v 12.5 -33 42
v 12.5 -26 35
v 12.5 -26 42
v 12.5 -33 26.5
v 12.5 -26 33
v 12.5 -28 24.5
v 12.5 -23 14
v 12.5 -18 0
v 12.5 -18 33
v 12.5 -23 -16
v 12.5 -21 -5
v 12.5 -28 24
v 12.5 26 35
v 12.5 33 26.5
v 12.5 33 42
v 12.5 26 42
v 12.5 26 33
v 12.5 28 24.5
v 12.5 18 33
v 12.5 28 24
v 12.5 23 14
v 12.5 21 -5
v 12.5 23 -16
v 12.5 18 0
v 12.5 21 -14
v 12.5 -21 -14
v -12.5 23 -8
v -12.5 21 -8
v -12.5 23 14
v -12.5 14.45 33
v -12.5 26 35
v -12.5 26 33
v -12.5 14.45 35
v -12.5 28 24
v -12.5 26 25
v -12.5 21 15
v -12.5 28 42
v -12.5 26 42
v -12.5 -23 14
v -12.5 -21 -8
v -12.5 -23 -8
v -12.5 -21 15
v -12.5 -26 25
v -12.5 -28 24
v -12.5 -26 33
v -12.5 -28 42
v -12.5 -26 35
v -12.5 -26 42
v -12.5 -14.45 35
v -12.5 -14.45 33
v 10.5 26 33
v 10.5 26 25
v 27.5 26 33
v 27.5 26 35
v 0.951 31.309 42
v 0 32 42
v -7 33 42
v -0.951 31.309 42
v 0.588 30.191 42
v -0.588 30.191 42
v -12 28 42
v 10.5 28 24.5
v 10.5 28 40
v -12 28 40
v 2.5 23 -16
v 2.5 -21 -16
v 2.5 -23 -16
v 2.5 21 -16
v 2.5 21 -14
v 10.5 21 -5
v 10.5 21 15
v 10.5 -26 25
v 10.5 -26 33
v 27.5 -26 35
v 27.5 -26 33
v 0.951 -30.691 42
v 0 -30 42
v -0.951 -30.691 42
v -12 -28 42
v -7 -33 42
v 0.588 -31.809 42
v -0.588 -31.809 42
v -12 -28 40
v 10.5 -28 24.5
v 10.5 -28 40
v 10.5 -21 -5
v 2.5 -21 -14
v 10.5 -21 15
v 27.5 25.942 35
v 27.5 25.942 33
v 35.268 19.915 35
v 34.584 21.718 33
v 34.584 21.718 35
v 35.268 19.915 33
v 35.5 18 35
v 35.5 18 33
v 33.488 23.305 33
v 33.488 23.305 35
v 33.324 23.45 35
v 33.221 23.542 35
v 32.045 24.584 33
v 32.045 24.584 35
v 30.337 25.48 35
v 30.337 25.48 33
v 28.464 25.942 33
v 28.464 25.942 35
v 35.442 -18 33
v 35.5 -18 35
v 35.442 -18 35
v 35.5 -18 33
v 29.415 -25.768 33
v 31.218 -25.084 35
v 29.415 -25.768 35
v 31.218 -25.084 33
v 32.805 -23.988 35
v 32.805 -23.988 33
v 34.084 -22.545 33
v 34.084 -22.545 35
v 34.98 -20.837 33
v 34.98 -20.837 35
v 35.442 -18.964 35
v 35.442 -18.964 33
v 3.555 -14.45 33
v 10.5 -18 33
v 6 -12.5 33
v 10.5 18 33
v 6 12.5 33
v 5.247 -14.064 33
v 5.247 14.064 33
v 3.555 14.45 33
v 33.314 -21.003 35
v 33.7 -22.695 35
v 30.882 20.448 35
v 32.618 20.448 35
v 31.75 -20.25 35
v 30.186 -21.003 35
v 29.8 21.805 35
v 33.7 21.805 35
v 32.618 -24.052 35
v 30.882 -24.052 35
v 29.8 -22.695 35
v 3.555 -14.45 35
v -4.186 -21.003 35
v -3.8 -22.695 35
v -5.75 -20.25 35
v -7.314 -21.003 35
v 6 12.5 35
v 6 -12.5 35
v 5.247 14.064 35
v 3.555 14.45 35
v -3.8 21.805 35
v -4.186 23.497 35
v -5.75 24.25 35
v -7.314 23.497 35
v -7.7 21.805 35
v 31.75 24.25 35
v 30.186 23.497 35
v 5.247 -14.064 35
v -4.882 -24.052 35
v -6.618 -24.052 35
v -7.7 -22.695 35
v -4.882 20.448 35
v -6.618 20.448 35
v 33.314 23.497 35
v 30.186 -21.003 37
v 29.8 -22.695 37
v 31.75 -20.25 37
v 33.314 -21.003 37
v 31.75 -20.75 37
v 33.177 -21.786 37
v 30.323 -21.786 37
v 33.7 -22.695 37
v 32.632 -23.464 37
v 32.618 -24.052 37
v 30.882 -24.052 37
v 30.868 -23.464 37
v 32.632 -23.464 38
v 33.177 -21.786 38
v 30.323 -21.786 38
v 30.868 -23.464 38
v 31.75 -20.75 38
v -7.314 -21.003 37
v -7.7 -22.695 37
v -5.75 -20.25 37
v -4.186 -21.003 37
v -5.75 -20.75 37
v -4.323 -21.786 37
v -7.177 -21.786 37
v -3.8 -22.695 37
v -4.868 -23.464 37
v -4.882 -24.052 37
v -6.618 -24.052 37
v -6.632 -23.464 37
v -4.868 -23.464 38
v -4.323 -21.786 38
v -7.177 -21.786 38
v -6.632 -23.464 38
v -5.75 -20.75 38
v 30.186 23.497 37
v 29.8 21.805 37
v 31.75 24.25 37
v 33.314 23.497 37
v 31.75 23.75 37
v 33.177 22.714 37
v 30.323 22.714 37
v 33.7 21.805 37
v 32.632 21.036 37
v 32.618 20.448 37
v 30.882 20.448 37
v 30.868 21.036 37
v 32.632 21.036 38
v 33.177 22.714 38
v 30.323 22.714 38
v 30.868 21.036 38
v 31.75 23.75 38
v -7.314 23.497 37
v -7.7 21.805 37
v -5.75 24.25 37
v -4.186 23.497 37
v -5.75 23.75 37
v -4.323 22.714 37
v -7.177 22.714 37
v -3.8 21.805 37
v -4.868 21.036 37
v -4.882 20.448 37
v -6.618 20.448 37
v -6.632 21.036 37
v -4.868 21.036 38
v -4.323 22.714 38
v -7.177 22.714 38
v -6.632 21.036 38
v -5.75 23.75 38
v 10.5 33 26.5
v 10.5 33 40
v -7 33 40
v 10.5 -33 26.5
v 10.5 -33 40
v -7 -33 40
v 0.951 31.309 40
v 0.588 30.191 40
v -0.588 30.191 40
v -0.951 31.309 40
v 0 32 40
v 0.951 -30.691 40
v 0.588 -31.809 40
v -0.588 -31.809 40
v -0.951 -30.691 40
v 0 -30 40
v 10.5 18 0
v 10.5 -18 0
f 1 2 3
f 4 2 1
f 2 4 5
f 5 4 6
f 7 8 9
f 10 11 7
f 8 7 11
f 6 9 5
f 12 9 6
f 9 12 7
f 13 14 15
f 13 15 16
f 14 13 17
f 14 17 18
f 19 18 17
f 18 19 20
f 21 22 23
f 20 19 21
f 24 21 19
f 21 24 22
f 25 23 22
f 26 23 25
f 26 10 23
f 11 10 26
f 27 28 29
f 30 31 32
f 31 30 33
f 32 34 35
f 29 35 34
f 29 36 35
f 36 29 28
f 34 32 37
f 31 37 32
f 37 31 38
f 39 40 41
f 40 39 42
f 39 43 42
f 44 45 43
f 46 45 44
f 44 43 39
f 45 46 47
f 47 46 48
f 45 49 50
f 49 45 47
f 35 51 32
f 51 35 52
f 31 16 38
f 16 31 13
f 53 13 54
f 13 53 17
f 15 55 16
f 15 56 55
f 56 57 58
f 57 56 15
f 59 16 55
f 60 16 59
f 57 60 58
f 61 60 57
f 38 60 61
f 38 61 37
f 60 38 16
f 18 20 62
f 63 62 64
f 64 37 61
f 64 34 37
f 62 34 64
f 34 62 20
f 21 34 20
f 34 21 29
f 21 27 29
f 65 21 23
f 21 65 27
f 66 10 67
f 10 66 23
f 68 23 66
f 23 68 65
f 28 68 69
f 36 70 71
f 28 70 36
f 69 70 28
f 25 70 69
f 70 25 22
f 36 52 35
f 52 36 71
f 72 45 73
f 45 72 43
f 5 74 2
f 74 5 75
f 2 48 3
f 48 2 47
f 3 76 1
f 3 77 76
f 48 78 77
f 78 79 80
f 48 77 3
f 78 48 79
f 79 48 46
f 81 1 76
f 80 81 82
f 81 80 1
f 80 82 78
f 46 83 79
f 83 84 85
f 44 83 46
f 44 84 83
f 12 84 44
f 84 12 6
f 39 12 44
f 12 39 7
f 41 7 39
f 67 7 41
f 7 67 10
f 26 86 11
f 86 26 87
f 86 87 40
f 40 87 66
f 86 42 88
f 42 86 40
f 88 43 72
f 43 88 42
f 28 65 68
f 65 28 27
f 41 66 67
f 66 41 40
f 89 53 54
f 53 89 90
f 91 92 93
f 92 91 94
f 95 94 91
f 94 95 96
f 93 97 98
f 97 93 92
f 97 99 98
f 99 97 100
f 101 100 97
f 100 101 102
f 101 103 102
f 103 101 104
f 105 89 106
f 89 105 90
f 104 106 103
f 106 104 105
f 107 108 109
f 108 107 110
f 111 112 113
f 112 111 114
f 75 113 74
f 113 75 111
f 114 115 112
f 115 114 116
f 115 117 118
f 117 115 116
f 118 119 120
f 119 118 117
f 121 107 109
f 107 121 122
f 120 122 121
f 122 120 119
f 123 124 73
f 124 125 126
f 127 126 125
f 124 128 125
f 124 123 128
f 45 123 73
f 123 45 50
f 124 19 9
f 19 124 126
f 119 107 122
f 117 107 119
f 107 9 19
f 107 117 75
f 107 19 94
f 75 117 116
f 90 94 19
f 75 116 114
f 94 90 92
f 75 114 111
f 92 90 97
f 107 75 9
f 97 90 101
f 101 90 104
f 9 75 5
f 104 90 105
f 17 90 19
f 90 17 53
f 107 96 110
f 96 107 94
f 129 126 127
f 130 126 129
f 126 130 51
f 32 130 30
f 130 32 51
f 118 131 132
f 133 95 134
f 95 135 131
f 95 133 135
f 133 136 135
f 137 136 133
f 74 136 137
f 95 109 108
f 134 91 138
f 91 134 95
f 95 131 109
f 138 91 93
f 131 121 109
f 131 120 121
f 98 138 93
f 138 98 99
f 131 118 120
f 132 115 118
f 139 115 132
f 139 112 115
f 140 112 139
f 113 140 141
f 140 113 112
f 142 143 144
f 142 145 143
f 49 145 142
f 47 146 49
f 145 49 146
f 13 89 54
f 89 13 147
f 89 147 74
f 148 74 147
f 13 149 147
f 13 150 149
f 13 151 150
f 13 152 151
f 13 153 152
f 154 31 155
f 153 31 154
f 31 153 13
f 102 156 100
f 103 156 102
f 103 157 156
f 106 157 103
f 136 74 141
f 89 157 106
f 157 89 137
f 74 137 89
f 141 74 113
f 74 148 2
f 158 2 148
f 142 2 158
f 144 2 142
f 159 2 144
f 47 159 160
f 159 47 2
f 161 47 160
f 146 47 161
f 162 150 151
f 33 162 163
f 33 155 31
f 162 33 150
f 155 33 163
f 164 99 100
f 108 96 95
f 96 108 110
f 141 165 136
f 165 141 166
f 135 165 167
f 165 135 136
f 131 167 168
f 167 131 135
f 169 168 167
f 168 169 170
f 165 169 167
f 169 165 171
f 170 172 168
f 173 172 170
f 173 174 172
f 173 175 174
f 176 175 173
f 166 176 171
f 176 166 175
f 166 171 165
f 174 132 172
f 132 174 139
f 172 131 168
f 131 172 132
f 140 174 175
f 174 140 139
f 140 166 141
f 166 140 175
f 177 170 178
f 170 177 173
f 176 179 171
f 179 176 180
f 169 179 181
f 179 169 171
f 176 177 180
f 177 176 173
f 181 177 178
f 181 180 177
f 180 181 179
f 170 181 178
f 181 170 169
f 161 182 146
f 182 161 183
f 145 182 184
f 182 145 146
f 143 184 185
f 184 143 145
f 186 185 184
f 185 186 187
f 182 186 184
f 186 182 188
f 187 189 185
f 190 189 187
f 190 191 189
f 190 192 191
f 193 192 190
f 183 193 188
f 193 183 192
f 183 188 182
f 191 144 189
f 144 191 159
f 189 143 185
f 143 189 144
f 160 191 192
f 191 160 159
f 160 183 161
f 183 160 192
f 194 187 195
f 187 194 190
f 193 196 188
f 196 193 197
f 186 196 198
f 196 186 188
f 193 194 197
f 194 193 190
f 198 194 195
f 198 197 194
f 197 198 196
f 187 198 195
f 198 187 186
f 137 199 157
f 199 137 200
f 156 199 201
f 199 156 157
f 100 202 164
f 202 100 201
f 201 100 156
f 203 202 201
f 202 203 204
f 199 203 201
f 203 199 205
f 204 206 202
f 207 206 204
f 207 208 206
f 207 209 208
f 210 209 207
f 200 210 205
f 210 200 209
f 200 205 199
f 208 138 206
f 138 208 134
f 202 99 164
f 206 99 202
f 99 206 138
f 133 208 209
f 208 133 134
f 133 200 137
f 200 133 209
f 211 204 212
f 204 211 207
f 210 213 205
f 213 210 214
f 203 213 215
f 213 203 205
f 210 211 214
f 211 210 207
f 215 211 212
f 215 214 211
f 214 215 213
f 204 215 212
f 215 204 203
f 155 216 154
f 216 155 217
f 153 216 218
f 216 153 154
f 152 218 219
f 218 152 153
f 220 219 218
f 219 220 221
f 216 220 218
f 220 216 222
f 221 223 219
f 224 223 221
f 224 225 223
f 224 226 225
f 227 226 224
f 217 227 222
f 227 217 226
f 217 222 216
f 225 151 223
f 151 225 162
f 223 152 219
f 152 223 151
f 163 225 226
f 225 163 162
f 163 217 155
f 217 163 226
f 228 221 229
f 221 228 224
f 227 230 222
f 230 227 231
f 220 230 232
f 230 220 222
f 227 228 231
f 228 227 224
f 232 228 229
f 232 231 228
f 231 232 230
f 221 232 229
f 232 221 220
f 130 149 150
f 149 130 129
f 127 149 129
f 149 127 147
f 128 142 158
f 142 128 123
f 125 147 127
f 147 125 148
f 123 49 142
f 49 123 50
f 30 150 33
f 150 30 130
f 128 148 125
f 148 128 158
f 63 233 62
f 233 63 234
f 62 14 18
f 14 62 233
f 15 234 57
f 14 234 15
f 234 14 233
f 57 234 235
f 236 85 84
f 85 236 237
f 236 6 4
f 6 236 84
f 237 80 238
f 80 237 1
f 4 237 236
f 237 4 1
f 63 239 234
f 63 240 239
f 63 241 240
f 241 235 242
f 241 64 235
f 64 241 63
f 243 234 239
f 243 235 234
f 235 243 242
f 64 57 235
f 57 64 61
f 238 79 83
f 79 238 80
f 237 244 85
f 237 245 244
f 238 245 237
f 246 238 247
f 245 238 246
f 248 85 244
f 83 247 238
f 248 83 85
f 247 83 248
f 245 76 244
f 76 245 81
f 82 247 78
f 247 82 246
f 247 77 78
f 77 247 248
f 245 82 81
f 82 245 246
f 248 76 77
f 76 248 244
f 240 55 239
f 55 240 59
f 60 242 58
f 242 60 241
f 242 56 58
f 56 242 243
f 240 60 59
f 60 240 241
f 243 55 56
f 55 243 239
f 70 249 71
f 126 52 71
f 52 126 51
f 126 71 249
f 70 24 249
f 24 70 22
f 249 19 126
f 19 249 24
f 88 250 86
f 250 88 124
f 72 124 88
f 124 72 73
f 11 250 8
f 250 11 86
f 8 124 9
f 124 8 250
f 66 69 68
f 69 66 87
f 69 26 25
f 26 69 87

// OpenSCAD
// file: speedo_config.scad
faceplate_display_width = 34;
faceplate_display_height = 23;
faceplate_thickness = 2;

faceplate_attach_hole_r = 1;
faceplate_attach_hole_span = 62;

bracket_thickness = 2;
bracket_display_width = 52;
bracket_faceplate_height = 42;
bracket_display_plate_height = 42 - 5 - 2;
bracket_inner_width = 46;
// main file
include <speedo_config.scad>

module sideplate() {
    linear_extrude(25, center=false)
        polygon(points=[
		[-16,0],
    		[15,0],
    		[25,(bracket_display_width-bracket_inner_width)/2+bracket_thickness],
    		[bracket_faceplate_height,(bracket_display_width-bracket_inner_width)/2+bracket_thickness],
    		[bracket_faceplate_height,(bracket_display_width-bracket_inner_width)/2+2*bracket_thickness],
    		[25-1,(bracket_display_width-bracket_inner_width)/2+2*bracket_thickness],
    		[15-1,bracket_thickness],
    		[-16,bracket_thickness]]);
}
    
module sideplate_trim() {
    linear_extrude(bracket_display_width, center=false)
        polygon(points=[[-16,0],[-8,15],[-16,15]]);
}

module sideplates() {
    difference() {
        union() {
            translate([0, bracket_inner_width/2-bracket_thickness, 0])
                sideplate();
            translate([0,-bracket_inner_width/2+bracket_thickness, 25])
                rotate(a=[180,0,0])
                    sideplate();
        }
        translate([0,bracket_display_width/2,10])
            rotate(a=[90,0,0])
                sideplate_trim();
    }
}

module reinforcement() {
    linear_extrude(bracket_thickness, center=false)
        polygon(points=[
            [-5,0],
    		[15,0],
    		[25,(bracket_display_width-bracket_inner_width)/2+bracket_thickness],
    		[bracket_display_plate_height-bracket_thickness,(bracket_display_width-bracket_inner_width)/2+bracket_thickness],
    		[bracket_display_plate_height-bracket_thickness,-3],
    		[25-1,-3],
    		[15-1,-3],
            [0,-3],
    		[-5,0]]);
}

module endplate() {
    linear_extrude(bracket_thickness, center=false)
        square([10,bracket_inner_width],center=false);
}

module reinforcements() {
    union() {
        translate([0, bracket_inner_width/2-bracket_thickness, 0])
            reinforcement();
        translate([0,-bracket_inner_width/2+bracket_thickness, bracket_thickness])
            rotate(a=[180,0,0])
                reinforcement();
    }
}

module display_post() {
    union() {
        cylinder(2, 2, 2, center=false);
        translate([0, 0, 2])
            cylinder(1, 1.5, 1.5, center=false);
    }
}

module display_posts() {
    union() {
        translate([-44.5 / 2.0, -37.5 / 2.0, 0]) display_post();
        translate([-44.5 / 2.0, 37.5 / 2.0, 0]) display_post();
        translate([44.5 / 2.0, -37.5 / 2.0, 0]) display_post();
        translate([44.5 / 2.0, 37.5 / 2.0, 0]) display_post();
    }
}

module display_hole() {
    cylinder(4, faceplate_attach_hole_r, faceplate_attach_hole_r, center=false);
}

module display_holes() {
    union() {
        translate([-faceplate_attach_hole_span/2, 0, -1])
            display_hole();
        translate([faceplate_attach_hole_span/2, 0, -1])
            display_hole();
    }
}

module faceplate_cutout() {
    minkowski() {
        linear_extrude(6, center=true)
            square([25, 25], center=true);
        cylinder(r=2,h=6);
    }
}

module plate_radius() {
    difference() {
        translate([8,8,0])
            linear_extrude(6, center=false)
                square(16, center=true);
        cylinder(r=8,h=6);
    }
}

module plate() {
    difference() {
        linear_extrude(bracket_thickness, center=false)
            square([48, bracket_display_width], center=true);
        translate([48/2-8, bracket_display_width/2-8, -2])
            plate_radius();
        translate([48/2-8, -bracket_display_width/2+8, -2])
            rotate(a=[0,0,-90])
                plate_radius();
    }
}

module displayplate() {
    difference() {
        union() {
            plate();
            translate([1.5, 0, 2])
                rotate(a=[0, 0, 90])
                    display_posts();
        }
        translate([-20,0,0])
            faceplate_cutout();
    }
}

module display_ear() {
    linear_extrude(bracket_thickness, center=false)
        polygon(points=[[-12,0],[12,0],[12,5],[-7,5]]);
}

module display_ears() {
    difference() {
        union() {
            translate([0, bracket_display_width/2+bracket_thickness, 0]) 
                display_ear();
            translate([0, -bracket_display_width/2-bracket_thickness, bracket_thickness])
                rotate(a=[180,0,0])
                    display_ear();
        }
        rotate(a=[0, 0, 90])
            display_holes();
    }
}

module pcb_ear() {
    linear_extrude(bracket_thickness, center=false)
        polygon(points=[[-5,0],[12.5,0],[12.5,5],[-3,5]]);
}

module pcb_ears() {
    translate([0, bracket_display_width/2+bracket_thickness, 0]) 
           pcb_ear();
    translate([0, -bracket_display_width/2-bracket_thickness, bracket_thickness])
        rotate(a=[180,0,0])
            pcb_ear();
}

module bracket() {
    union() {
        translate([25/2,0,0])
            rotate(a=[0,-90,0])
                sideplates();
        translate([11.5, 0, 42-5-bracket_thickness-2])
            displayplate();
        translate([25/2, 0, bracket_faceplate_height-12.5]) 
            rotate(a=[0,-90,0])
                pcb_ears();
        translate([0, 0, bracket_faceplate_height-bracket_thickness])
            display_ears();
        translate([12.5,0,0])
            rotate(a=[0,-90,0])
                reinforcements();
        translate([2.5,-bracket_inner_width/2,-16])
            rotate(a=[0,0,0])
                endplate();
    }
}

bracket();
